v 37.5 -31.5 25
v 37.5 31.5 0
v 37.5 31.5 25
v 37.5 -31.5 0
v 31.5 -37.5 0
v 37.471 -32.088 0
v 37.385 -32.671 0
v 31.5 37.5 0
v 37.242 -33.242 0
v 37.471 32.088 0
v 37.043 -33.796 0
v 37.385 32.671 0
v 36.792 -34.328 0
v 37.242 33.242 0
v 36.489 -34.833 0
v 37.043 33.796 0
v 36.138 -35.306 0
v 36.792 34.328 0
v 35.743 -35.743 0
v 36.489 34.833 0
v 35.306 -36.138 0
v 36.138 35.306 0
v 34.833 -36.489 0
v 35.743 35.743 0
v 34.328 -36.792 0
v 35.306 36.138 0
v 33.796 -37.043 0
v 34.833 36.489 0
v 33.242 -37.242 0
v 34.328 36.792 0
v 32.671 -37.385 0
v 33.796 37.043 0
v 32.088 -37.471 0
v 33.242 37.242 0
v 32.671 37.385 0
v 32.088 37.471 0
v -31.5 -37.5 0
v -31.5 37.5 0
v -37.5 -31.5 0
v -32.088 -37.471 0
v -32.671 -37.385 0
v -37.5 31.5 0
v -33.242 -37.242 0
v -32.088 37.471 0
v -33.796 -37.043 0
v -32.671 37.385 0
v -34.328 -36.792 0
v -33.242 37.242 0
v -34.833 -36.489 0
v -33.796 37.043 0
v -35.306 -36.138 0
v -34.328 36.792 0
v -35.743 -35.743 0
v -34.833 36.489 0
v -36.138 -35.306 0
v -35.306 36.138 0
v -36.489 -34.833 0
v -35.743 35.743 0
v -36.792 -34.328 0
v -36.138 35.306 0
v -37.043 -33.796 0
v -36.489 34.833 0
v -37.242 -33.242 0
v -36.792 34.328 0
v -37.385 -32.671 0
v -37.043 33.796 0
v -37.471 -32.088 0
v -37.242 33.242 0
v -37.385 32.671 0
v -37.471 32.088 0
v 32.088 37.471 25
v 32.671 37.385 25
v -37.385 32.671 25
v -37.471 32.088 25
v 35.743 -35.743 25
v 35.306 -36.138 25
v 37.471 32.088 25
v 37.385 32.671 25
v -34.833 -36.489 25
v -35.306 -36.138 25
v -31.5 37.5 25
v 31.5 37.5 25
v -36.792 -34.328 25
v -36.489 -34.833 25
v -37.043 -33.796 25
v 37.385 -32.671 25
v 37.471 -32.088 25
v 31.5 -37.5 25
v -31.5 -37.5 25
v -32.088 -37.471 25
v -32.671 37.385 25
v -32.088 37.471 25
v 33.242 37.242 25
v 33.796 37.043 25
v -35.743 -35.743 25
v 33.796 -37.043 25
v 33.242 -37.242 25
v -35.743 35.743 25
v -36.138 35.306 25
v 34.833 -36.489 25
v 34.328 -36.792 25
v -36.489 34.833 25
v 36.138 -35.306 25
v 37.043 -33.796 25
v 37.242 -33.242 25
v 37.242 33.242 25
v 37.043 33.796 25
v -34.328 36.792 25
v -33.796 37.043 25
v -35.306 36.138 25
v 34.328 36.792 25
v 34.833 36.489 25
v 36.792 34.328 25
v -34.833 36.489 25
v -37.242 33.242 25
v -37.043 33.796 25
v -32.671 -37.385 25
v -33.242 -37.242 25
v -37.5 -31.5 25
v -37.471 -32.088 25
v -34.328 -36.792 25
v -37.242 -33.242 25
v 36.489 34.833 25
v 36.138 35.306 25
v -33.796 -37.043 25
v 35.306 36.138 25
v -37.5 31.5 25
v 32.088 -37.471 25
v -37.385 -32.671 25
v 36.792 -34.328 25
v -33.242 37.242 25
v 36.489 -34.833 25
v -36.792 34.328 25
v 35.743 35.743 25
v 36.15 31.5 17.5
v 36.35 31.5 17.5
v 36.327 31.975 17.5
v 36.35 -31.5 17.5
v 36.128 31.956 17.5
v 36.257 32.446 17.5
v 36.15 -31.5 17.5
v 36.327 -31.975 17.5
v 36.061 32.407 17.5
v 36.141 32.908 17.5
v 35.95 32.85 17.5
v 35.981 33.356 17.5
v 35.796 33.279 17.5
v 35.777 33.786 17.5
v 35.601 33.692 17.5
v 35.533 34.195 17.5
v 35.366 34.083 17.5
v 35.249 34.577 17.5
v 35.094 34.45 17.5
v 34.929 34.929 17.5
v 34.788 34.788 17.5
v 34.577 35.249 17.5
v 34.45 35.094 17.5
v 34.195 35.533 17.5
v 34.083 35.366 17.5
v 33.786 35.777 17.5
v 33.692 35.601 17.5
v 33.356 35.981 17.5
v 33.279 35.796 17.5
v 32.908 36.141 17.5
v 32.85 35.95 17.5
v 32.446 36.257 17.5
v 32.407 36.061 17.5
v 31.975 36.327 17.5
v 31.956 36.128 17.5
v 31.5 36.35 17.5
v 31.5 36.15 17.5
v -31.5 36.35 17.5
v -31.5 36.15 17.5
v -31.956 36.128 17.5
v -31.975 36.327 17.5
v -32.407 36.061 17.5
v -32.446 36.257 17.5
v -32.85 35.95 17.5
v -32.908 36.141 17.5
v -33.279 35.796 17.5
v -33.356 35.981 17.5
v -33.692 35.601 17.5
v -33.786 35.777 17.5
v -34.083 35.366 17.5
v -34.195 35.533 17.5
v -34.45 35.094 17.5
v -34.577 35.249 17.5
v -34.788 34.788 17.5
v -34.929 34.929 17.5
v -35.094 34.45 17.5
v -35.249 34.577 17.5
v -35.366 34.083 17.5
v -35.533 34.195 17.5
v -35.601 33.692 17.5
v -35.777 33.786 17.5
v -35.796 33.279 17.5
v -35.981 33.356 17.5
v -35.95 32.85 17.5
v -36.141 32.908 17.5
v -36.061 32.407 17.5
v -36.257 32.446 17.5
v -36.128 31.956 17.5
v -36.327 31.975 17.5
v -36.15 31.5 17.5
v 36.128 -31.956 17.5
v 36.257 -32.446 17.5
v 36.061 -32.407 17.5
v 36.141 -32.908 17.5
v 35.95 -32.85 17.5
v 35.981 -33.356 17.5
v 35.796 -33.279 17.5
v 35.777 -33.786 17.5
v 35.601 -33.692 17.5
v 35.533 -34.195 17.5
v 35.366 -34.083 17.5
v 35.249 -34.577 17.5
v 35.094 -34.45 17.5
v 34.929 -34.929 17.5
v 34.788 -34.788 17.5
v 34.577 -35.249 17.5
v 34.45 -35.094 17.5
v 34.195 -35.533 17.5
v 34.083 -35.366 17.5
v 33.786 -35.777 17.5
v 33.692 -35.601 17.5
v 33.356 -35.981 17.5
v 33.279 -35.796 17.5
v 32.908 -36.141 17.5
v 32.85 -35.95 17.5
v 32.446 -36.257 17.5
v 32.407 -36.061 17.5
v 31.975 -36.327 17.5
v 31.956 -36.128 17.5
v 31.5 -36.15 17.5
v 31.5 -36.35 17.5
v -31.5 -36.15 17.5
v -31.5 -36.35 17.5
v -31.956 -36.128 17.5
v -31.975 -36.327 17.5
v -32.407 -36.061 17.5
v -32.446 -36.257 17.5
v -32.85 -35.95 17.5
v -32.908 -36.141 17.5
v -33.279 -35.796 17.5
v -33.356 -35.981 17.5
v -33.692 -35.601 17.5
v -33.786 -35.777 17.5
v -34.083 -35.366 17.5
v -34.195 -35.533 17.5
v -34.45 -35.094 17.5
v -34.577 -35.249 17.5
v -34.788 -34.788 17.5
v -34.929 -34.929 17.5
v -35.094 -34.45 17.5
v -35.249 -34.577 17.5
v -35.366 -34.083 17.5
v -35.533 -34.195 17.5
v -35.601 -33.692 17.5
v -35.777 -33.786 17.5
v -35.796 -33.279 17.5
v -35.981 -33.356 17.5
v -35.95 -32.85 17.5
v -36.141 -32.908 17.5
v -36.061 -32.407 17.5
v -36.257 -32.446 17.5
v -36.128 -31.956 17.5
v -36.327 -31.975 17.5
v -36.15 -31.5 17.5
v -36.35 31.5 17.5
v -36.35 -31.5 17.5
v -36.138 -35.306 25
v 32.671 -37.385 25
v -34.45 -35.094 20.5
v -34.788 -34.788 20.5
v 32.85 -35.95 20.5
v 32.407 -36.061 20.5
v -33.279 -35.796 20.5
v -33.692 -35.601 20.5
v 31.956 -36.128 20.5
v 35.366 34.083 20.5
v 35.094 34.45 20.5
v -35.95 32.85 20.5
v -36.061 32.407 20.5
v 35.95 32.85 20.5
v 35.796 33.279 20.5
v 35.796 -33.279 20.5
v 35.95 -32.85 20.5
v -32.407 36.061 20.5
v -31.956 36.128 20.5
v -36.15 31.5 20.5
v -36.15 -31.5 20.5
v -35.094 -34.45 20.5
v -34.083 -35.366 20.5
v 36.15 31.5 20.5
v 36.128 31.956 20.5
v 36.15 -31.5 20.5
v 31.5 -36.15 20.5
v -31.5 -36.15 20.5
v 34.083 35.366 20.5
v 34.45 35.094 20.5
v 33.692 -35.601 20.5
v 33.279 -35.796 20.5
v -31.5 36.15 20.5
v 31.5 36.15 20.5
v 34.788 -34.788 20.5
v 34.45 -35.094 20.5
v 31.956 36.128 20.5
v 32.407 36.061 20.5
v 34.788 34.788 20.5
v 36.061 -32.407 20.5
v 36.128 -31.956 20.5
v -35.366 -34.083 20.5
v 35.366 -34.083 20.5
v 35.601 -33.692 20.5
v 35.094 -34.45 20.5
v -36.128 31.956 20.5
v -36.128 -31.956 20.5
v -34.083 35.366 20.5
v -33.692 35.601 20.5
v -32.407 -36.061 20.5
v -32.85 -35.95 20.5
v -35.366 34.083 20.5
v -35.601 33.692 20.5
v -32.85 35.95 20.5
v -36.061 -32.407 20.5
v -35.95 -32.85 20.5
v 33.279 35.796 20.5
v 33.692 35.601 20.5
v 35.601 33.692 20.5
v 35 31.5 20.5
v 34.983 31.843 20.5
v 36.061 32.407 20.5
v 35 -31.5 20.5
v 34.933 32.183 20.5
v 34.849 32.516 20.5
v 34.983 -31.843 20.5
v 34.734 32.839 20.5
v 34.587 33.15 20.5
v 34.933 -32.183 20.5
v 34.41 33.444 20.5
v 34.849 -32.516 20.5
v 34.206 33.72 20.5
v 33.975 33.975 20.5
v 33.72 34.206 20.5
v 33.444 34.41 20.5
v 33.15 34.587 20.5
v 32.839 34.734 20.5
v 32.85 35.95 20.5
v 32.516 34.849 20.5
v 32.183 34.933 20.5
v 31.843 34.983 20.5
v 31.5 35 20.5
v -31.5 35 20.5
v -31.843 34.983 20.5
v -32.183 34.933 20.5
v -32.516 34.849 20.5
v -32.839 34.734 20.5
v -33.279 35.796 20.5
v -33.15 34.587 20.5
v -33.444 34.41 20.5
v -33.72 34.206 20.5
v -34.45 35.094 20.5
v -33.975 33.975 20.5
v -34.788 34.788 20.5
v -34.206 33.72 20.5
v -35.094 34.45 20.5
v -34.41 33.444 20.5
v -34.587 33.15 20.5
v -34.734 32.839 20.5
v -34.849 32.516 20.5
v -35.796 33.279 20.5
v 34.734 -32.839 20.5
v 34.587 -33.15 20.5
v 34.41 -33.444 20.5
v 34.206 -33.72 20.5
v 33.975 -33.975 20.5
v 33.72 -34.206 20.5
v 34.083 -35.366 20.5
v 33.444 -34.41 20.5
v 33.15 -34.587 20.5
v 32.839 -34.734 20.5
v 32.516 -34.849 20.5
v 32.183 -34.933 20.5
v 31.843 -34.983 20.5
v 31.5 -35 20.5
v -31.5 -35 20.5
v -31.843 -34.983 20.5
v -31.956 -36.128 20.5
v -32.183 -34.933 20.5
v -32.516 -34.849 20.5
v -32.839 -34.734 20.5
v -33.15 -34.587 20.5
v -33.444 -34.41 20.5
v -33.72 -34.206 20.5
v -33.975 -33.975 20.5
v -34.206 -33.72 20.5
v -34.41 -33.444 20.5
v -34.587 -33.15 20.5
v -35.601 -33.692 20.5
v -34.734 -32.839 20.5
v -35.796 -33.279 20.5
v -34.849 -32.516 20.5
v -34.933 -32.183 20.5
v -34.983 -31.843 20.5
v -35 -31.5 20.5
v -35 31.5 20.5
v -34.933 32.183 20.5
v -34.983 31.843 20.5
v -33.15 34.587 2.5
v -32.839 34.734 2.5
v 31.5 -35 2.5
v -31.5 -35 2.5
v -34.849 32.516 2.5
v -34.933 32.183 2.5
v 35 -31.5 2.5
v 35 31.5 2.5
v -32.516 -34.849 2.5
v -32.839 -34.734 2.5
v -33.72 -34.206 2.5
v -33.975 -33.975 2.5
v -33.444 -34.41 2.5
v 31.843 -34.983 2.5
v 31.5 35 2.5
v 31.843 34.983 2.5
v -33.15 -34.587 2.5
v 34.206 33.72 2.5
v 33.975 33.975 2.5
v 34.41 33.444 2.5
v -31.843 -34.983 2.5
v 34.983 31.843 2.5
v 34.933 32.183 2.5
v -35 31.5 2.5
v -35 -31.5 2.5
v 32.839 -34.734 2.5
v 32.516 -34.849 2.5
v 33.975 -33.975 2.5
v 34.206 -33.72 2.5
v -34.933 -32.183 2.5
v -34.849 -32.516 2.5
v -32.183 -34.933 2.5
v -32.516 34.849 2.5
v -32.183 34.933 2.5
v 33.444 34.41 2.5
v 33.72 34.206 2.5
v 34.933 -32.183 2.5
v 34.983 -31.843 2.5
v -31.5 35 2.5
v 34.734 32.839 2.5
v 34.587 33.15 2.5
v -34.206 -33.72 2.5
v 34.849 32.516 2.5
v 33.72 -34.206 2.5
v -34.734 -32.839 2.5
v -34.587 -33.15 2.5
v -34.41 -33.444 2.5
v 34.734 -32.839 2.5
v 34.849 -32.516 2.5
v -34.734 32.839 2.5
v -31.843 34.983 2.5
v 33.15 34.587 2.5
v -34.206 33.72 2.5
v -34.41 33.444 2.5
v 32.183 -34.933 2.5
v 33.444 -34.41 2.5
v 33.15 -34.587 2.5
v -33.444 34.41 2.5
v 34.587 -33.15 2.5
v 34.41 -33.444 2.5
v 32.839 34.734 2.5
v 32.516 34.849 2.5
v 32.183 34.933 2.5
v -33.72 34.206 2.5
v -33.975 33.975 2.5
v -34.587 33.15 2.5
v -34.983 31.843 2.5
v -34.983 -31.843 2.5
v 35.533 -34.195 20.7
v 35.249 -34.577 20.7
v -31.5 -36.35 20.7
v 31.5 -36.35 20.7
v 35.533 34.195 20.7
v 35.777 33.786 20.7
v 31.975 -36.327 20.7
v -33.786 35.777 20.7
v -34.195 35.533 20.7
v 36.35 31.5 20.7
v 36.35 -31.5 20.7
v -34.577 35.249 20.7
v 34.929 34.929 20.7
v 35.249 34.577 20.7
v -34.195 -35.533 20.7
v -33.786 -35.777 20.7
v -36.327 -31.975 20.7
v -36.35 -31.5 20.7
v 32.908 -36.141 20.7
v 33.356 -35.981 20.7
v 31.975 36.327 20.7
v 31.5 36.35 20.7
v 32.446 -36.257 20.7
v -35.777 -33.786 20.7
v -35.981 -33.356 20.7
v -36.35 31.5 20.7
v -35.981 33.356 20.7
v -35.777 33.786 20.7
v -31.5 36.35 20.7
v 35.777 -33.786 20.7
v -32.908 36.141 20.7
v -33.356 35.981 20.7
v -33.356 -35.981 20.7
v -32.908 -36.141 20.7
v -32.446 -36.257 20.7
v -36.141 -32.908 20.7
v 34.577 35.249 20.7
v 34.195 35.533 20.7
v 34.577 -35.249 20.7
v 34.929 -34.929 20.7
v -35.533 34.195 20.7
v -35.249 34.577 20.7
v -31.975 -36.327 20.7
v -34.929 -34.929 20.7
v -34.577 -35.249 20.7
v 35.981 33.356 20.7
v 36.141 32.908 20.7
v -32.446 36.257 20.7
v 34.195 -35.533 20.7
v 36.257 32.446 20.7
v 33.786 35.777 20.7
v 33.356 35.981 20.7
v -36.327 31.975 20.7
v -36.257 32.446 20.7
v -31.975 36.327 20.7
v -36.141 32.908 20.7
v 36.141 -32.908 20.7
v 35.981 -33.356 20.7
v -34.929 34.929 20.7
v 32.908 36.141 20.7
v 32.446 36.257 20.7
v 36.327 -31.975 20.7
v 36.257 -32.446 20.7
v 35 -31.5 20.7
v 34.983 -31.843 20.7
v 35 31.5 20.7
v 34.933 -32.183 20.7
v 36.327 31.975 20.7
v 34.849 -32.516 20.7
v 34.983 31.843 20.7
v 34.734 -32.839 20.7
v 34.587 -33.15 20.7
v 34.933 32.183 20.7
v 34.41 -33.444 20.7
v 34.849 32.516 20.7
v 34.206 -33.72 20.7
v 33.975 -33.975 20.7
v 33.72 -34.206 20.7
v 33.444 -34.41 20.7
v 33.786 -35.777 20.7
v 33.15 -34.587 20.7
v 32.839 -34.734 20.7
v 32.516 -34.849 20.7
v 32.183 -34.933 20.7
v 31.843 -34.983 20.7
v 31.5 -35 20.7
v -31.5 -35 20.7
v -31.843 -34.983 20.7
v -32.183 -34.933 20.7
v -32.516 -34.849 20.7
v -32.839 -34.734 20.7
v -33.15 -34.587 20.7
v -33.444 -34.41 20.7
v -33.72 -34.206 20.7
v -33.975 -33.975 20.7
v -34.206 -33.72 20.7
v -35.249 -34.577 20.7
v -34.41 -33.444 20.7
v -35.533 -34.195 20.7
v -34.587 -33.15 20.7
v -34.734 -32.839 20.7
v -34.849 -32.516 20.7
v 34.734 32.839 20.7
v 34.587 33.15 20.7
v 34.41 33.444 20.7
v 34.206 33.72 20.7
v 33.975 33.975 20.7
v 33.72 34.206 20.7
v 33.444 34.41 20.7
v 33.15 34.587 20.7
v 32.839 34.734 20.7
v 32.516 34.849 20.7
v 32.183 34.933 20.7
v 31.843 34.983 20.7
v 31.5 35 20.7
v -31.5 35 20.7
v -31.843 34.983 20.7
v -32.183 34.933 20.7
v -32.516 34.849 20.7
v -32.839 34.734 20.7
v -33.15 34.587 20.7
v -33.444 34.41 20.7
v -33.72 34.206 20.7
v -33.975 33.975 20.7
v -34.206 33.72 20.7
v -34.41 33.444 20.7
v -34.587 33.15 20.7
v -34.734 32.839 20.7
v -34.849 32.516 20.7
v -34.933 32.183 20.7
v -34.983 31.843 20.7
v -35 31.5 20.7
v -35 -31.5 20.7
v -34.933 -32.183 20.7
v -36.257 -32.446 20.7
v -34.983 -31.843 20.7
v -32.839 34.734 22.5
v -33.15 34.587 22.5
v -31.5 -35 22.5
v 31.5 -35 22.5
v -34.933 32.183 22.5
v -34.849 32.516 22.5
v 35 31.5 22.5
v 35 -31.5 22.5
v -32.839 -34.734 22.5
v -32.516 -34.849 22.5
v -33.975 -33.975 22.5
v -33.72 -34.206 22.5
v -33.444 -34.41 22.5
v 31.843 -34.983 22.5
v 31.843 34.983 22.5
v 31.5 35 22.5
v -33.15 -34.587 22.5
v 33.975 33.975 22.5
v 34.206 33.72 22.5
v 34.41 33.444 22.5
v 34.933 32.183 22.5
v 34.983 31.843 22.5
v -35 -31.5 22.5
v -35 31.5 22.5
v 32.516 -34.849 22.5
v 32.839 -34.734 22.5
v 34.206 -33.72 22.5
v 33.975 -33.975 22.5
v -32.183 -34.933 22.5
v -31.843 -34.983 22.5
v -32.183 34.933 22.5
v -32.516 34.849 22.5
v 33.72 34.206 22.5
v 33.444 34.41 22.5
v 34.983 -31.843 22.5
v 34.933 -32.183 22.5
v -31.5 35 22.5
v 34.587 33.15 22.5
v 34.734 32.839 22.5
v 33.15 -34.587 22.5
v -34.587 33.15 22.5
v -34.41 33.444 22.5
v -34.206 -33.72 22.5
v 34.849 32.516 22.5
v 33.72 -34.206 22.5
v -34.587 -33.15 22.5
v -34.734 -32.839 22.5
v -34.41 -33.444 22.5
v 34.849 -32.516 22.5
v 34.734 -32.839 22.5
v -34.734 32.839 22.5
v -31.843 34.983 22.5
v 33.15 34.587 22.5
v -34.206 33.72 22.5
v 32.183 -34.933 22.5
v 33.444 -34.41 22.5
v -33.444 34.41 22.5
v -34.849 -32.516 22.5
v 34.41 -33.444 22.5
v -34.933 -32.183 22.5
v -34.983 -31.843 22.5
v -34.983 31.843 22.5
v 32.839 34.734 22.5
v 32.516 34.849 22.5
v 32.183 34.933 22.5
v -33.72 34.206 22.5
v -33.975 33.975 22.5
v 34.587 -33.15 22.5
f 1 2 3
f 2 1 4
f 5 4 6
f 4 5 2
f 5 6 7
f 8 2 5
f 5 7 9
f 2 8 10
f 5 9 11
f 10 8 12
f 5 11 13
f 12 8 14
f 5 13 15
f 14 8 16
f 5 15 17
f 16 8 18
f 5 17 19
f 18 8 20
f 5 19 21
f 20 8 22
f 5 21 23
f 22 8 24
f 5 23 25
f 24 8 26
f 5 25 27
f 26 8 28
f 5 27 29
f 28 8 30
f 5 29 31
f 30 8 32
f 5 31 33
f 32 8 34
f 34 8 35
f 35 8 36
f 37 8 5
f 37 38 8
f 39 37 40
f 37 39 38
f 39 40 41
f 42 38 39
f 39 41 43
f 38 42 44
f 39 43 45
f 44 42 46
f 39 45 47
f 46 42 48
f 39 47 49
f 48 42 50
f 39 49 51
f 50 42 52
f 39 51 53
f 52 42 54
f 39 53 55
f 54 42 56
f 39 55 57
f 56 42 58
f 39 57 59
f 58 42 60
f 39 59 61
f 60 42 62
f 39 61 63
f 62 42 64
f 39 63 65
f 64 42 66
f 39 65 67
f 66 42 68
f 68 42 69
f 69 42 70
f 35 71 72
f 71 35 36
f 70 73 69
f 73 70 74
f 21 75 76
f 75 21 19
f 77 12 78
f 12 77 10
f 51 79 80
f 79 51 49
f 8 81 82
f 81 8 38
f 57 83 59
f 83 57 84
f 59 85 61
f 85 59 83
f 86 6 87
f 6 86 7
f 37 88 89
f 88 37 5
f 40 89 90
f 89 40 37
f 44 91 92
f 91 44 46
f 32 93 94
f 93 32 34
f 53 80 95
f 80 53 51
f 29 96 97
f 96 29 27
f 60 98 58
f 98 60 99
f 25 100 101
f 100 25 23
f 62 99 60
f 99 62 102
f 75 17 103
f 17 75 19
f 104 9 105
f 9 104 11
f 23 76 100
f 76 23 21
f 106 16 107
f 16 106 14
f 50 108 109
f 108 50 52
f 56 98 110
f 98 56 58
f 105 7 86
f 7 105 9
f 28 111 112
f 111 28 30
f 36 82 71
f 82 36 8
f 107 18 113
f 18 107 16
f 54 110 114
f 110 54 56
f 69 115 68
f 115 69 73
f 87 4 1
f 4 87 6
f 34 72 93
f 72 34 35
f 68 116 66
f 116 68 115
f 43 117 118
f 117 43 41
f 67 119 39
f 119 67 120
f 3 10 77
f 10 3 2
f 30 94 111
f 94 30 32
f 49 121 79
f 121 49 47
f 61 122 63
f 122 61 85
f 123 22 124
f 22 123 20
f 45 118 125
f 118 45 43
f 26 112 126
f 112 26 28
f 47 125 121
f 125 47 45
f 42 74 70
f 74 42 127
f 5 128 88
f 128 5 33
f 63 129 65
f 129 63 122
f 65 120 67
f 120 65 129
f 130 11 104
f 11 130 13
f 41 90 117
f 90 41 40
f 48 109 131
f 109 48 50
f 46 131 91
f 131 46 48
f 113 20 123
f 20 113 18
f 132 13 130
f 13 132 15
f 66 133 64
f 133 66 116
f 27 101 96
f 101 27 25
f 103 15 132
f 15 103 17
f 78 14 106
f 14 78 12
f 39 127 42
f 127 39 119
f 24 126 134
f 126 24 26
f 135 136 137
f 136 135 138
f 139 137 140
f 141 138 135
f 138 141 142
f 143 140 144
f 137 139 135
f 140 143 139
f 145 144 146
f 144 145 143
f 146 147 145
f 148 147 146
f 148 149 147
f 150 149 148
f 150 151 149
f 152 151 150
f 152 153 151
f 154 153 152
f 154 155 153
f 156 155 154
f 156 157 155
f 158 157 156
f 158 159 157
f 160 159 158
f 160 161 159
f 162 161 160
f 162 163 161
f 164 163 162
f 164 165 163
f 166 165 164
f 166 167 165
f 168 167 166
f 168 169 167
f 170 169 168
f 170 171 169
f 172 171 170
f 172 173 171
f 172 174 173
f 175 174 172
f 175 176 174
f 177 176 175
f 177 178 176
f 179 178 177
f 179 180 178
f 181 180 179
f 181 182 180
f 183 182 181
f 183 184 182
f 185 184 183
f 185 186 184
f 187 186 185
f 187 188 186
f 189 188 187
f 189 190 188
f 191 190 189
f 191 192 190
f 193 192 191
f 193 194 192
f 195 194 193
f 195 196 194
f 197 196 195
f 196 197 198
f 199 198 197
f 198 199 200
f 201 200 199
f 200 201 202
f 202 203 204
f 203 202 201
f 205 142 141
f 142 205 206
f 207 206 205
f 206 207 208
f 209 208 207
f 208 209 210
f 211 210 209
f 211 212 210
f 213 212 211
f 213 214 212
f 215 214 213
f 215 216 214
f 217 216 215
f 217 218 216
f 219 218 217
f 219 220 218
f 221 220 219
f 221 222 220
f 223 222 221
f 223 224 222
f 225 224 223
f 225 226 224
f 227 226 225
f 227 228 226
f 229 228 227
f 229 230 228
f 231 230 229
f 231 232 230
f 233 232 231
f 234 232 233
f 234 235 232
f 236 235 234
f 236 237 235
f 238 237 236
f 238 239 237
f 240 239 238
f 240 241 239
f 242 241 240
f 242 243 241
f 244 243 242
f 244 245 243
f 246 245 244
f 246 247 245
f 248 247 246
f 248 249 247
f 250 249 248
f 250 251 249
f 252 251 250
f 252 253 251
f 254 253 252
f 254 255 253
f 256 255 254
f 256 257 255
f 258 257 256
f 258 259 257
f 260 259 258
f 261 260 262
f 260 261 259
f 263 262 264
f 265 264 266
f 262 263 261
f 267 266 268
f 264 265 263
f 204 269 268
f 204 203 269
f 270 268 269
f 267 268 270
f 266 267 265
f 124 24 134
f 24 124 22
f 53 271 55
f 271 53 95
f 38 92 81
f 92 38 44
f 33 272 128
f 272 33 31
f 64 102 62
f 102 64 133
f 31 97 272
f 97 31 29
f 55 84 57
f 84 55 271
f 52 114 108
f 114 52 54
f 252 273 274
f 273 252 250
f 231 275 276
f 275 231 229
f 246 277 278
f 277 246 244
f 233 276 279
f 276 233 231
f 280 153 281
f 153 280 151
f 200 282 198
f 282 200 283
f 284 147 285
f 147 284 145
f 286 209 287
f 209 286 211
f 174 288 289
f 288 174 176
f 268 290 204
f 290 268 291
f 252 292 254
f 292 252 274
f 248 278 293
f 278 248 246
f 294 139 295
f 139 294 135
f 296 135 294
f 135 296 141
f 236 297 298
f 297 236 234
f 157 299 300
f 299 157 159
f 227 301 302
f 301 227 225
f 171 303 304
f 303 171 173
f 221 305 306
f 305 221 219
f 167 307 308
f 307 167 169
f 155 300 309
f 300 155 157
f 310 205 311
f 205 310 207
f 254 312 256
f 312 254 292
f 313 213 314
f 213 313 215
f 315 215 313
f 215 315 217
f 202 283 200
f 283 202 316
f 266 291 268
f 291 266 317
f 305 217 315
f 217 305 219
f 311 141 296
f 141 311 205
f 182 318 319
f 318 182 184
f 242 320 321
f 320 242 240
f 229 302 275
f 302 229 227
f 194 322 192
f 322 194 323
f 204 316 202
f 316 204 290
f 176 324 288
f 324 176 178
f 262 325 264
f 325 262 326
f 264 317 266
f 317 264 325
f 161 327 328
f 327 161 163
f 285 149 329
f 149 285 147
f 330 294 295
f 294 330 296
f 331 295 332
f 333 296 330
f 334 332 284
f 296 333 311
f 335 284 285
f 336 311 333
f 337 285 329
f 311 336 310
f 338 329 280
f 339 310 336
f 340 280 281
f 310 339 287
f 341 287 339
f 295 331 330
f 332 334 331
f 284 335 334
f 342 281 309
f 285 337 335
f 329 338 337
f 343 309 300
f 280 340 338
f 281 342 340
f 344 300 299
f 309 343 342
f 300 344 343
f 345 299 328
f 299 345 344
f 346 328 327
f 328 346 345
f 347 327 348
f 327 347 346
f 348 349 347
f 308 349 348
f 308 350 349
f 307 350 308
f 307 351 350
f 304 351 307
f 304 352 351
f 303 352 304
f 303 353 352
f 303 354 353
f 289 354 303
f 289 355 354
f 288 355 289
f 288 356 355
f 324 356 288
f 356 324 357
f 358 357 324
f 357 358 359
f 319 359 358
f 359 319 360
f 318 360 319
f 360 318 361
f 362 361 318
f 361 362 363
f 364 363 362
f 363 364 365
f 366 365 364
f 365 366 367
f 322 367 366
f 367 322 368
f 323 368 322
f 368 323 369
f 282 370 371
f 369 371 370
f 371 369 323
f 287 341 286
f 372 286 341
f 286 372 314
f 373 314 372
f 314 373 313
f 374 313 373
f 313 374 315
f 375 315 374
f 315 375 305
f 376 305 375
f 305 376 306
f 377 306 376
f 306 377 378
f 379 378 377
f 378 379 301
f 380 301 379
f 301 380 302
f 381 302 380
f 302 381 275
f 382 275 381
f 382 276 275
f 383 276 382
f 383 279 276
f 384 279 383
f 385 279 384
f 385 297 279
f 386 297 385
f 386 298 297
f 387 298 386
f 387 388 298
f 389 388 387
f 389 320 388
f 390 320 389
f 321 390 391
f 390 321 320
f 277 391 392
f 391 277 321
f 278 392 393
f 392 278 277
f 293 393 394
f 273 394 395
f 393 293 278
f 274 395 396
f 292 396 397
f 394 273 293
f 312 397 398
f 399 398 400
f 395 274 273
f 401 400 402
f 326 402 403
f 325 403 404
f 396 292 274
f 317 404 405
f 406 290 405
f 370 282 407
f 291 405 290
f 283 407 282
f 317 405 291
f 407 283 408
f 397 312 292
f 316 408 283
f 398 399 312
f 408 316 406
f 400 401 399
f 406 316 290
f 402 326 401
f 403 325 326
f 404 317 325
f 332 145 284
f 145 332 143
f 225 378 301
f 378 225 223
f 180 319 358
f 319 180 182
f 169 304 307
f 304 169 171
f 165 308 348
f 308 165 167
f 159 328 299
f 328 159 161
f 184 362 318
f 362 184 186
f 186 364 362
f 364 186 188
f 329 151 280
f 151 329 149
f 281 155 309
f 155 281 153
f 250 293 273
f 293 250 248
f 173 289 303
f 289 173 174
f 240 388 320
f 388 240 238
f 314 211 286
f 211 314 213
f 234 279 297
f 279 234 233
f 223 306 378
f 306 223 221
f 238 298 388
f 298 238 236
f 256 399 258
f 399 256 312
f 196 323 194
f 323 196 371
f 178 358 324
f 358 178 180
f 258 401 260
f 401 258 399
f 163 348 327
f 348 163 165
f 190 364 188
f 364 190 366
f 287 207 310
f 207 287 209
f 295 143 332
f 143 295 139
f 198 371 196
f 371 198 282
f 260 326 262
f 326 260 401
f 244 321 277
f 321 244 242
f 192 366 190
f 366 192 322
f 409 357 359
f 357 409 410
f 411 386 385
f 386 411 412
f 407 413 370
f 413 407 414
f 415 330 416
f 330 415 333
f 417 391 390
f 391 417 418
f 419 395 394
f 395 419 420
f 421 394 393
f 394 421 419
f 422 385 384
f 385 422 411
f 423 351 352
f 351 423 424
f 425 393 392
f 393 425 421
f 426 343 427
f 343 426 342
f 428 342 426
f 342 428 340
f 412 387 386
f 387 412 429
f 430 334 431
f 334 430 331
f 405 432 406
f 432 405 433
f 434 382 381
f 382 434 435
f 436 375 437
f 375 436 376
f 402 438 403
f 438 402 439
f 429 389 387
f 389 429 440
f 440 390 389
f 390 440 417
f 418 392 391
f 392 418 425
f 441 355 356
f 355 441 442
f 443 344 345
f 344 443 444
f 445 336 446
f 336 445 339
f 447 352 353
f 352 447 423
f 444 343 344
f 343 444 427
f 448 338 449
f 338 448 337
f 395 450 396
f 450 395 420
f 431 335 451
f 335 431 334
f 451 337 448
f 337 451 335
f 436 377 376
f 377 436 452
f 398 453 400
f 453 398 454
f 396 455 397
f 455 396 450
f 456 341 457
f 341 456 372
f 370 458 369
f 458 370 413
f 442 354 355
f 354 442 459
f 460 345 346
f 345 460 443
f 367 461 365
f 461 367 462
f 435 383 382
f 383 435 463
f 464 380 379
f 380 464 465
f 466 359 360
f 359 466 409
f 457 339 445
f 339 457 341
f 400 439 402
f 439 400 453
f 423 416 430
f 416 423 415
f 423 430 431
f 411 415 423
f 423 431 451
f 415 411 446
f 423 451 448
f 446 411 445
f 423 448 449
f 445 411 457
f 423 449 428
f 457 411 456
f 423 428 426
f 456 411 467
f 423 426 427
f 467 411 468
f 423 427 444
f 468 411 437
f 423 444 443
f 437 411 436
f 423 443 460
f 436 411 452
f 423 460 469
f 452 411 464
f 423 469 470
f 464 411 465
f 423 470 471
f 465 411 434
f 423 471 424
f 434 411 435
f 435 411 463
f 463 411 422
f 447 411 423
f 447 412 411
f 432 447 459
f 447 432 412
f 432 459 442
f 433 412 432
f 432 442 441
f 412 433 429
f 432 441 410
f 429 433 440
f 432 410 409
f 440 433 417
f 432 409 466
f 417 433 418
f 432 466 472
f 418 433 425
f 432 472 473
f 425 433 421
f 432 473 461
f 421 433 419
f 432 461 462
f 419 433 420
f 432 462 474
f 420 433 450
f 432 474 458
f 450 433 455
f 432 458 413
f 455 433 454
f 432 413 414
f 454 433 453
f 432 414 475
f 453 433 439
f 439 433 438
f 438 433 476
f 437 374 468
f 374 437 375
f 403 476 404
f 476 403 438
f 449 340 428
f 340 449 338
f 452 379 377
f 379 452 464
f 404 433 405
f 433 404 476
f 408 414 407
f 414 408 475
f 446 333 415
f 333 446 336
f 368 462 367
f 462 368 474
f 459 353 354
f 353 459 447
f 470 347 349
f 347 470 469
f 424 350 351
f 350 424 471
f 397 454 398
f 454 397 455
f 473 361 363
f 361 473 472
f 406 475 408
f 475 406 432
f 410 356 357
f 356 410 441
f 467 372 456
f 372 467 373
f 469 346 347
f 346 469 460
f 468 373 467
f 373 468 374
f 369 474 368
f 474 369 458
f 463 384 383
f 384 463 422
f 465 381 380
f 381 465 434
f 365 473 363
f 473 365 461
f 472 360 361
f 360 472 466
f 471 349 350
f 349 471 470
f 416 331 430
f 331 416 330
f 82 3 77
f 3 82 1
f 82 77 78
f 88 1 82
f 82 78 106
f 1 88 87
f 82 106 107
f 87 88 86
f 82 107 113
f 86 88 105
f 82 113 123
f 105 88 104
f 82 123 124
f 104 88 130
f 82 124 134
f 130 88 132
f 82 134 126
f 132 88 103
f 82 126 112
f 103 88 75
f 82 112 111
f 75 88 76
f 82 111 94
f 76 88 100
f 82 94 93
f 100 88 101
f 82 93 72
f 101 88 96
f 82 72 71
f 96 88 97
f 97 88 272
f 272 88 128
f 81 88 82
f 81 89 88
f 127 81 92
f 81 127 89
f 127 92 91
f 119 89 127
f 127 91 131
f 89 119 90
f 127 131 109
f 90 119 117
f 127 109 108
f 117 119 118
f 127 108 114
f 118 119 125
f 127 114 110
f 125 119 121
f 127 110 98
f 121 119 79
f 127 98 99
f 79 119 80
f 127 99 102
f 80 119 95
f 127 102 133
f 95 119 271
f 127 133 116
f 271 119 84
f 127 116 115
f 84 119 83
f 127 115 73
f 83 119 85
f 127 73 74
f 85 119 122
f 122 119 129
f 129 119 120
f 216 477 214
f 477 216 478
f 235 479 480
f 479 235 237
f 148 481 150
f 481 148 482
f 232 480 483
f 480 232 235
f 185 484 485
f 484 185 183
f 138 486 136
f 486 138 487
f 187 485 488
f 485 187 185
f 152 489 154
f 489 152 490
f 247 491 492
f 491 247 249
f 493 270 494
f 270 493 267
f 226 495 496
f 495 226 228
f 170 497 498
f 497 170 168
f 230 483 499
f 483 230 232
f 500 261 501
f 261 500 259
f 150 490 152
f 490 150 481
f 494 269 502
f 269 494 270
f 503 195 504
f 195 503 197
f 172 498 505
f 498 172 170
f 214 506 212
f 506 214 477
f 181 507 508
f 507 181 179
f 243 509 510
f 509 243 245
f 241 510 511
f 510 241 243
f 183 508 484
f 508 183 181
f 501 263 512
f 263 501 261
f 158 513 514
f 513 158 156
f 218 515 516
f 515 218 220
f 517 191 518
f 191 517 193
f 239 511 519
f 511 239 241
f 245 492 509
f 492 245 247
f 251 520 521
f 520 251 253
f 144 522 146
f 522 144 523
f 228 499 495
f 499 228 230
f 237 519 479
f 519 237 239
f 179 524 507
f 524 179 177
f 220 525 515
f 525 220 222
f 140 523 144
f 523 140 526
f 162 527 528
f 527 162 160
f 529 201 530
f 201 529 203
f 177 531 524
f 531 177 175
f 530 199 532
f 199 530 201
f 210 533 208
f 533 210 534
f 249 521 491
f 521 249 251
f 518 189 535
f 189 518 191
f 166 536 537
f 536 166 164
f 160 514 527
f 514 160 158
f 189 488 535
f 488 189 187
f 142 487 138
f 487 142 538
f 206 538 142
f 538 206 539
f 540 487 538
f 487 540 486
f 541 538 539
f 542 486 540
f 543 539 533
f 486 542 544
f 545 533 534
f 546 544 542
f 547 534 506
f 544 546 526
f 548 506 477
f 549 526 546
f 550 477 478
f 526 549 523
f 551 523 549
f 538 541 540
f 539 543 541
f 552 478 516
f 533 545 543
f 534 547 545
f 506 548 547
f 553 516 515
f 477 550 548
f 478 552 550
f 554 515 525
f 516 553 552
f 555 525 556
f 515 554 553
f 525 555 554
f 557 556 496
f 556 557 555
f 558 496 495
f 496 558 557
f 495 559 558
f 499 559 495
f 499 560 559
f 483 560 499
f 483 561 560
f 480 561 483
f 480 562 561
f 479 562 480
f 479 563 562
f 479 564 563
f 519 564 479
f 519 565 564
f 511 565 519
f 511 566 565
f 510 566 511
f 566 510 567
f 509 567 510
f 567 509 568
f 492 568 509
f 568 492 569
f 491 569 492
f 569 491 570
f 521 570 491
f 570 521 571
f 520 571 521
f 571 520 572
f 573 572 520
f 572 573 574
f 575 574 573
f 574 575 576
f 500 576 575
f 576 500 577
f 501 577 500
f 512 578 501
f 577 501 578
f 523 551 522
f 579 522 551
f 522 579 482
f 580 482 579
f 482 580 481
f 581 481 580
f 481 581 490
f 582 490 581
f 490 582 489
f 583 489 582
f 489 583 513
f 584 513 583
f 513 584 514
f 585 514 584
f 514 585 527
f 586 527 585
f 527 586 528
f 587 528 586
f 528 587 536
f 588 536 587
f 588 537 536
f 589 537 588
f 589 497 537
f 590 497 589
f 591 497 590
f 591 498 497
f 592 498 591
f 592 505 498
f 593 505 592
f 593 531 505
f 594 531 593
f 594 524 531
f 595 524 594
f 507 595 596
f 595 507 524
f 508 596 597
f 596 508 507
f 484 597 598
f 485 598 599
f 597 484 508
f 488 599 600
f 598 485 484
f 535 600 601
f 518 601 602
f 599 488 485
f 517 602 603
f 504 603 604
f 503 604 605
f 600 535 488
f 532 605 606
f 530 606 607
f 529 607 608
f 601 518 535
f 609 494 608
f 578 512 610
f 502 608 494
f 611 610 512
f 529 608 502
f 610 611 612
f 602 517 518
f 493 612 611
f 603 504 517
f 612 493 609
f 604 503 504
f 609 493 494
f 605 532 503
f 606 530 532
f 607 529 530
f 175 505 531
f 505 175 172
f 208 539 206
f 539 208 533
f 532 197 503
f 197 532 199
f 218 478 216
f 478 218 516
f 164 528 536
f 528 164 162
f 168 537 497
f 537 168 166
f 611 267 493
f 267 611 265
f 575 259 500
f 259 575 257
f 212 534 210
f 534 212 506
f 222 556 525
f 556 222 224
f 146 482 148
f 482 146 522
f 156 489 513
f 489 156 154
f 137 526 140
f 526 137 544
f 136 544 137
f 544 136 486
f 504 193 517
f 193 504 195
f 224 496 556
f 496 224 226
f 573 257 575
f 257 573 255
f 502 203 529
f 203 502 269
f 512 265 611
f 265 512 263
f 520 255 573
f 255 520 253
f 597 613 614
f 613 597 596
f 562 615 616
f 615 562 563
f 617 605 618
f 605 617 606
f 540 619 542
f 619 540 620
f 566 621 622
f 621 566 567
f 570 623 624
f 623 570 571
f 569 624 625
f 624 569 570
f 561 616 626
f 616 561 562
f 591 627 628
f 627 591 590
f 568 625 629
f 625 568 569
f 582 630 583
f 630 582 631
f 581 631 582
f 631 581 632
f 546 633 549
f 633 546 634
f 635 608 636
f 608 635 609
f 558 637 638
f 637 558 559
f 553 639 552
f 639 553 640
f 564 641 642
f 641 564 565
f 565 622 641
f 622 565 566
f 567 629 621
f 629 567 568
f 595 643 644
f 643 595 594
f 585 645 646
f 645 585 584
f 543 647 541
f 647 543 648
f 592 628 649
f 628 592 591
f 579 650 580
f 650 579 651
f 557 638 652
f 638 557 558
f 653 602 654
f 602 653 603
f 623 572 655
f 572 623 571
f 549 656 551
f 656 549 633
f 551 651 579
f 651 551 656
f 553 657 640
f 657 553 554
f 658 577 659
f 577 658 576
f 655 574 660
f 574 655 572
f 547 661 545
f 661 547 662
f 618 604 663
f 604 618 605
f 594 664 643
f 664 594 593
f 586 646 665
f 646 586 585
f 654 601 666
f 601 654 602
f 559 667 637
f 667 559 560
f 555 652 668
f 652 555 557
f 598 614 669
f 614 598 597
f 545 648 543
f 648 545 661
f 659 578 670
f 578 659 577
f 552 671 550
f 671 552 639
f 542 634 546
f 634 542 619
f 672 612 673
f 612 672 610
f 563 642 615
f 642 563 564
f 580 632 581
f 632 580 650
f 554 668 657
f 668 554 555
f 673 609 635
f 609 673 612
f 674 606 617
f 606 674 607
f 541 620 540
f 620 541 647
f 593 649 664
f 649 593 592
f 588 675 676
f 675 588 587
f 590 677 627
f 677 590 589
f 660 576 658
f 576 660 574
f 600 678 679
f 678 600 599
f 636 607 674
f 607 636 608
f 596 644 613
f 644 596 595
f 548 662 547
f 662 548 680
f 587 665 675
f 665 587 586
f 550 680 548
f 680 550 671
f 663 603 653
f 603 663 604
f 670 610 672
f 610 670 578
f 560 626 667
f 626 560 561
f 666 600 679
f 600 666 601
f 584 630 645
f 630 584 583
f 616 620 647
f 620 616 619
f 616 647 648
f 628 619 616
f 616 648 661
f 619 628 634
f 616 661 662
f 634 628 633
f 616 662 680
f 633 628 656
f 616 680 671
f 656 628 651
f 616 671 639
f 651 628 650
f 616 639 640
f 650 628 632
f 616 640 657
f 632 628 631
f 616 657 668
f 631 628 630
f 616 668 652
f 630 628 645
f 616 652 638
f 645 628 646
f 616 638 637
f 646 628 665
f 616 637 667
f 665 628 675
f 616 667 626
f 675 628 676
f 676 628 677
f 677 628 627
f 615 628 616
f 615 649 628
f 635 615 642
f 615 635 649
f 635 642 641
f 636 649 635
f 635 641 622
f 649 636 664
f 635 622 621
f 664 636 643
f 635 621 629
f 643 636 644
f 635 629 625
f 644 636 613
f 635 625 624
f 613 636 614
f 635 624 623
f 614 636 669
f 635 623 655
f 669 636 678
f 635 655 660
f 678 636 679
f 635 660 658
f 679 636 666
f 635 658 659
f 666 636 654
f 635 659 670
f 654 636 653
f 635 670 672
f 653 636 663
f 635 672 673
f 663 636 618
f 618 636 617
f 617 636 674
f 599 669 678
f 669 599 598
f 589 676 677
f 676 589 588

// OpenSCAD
// ============================================================================
// 3D-Printable Two-Part Enclosure
// Designed by Antigravity
//
// Key Features:
// - Parametric design with 70x70x20mm minimum internal cavity
// - Uniform 2.5mm wall thickness
// - Snug lip/groove mating joint with 0.2mm nominal printing clearance
// - Rounded corners (6.0mm outer, 3.5mm inner) for strength and aesthetics
// - Semi-transparent lid for visual inspection of mating surfaces
// ============================================================================

// --- Parameters ---
cavity_x = 70.0;      // Internal cavity length (mm)
cavity_y = 70.0;      // Internal cavity width (mm)
cavity_z = 20.0;      // Total internal cavity height (mm)
wall_thick = 2.5;     // Wall thickness (mm)
clearance = 0.2;      // Print clearance between mating parts (mm)

// --- Mating Joint Configuration ---
lip_height = 3.0;     // Vertical height of the alignment lip (mm)
// Lip thickness is half the wall thickness minus half the clearance,
// which balances strength between base and lid flanges.
lip_thick = (wall_thick - clearance) / 2; 

// --- Aesthetics ---
outer_radius = 6.0;   // Outer corner fillet radius (mm)
inner_radius = outer_radius - wall_thick; // Inner corner fillet radius (mm)

// --- Z-Split Partition ---
// We split the 20mm cavity height: 15mm in the base, 5mm in the lid.
base_cavity_z = 15.0; 
lid_cavity_z = cavity_z - base_cavity_z;

// --- Calculated Dimensions ---
outer_x = cavity_x + 2 * wall_thick;
outer_y = cavity_y + 2 * wall_thick;
base_height = base_cavity_z + wall_thick; // Base top mating plane (Z = 17.5)
lid_height = lid_cavity_z + wall_thick;   // Lid height from mating plane (7.5)

// --- Helper Module ---
module rounded_column(w, d, h, r) {
    radius = max(r, 0.01);
    hull() {
        translate([-w/2 + radius, -d/2 + radius, 0]) cylinder(h=h, r=radius, $fn=64);
        translate([ w/2 - radius, -d/2 + radius, 0]) cylinder(h=h, r=radius, $fn=64);
        translate([-w/2 + radius,  d/2 - radius, 0]) cylinder(h=h, r=radius, $fn=64);
        translate([ w/2 - radius,  d/2 - radius, 0]) cylinder(h=h, r=radius, $fn=64);
    }
}

// --- Base Module ---
module base() {
    difference() {
        union() {
            // Main outer shell of base
            rounded_column(outer_x, outer_y, base_height, outer_radius);
            
            // Alignment lip (inner part of the split wall)
            translate([0, 0, base_height])
                rounded_column(cavity_x + 2 * lip_thick, cavity_y + 2 * lip_thick, lip_height, inner_radius + lip_thick);
        }
        
        // Inner cavity subtraction
        translate([0, 0, wall_thick])
            rounded_column(cavity_x, cavity_y, base_height + lip_height + 1.0, inner_radius);
    }
}

// --- Lid Module ---
module lid() {
    // Sits in its assembled position starting at Z = base_height
    translate([0, 0, base_height]) {
        difference() {
            // Main outer shell of lid
            rounded_column(outer_x, outer_y, lid_height, outer_radius);
            
            // Joint pocket to receive base lip (with clearance)
            translate([0, 0, -0.1])
                rounded_column(cavity_x + 2 * lip_thick + 2 * clearance, cavity_y + 2 * lip_thick + 2 * clearance, lip_height + clearance + 0.1, inner_radius + lip_thick + clearance);
            
            // Inner cavity extension into lid
            translate([0, 0, -0.1])
                rounded_column(cavity_x, cavity_y, lid_height - wall_thick + 0.1, inner_radius);
        }
    }
}

// --- Render Assembly ---
// Render base as a solid blue slate
color([0.25, 0.45, 0.85, 1.0]) {
    base();
}

// Render lid as a semi-transparent crimson to inspect internal clearance
color([0.90, 0.35, 0.45, 0.75]) {
    lid();
}
